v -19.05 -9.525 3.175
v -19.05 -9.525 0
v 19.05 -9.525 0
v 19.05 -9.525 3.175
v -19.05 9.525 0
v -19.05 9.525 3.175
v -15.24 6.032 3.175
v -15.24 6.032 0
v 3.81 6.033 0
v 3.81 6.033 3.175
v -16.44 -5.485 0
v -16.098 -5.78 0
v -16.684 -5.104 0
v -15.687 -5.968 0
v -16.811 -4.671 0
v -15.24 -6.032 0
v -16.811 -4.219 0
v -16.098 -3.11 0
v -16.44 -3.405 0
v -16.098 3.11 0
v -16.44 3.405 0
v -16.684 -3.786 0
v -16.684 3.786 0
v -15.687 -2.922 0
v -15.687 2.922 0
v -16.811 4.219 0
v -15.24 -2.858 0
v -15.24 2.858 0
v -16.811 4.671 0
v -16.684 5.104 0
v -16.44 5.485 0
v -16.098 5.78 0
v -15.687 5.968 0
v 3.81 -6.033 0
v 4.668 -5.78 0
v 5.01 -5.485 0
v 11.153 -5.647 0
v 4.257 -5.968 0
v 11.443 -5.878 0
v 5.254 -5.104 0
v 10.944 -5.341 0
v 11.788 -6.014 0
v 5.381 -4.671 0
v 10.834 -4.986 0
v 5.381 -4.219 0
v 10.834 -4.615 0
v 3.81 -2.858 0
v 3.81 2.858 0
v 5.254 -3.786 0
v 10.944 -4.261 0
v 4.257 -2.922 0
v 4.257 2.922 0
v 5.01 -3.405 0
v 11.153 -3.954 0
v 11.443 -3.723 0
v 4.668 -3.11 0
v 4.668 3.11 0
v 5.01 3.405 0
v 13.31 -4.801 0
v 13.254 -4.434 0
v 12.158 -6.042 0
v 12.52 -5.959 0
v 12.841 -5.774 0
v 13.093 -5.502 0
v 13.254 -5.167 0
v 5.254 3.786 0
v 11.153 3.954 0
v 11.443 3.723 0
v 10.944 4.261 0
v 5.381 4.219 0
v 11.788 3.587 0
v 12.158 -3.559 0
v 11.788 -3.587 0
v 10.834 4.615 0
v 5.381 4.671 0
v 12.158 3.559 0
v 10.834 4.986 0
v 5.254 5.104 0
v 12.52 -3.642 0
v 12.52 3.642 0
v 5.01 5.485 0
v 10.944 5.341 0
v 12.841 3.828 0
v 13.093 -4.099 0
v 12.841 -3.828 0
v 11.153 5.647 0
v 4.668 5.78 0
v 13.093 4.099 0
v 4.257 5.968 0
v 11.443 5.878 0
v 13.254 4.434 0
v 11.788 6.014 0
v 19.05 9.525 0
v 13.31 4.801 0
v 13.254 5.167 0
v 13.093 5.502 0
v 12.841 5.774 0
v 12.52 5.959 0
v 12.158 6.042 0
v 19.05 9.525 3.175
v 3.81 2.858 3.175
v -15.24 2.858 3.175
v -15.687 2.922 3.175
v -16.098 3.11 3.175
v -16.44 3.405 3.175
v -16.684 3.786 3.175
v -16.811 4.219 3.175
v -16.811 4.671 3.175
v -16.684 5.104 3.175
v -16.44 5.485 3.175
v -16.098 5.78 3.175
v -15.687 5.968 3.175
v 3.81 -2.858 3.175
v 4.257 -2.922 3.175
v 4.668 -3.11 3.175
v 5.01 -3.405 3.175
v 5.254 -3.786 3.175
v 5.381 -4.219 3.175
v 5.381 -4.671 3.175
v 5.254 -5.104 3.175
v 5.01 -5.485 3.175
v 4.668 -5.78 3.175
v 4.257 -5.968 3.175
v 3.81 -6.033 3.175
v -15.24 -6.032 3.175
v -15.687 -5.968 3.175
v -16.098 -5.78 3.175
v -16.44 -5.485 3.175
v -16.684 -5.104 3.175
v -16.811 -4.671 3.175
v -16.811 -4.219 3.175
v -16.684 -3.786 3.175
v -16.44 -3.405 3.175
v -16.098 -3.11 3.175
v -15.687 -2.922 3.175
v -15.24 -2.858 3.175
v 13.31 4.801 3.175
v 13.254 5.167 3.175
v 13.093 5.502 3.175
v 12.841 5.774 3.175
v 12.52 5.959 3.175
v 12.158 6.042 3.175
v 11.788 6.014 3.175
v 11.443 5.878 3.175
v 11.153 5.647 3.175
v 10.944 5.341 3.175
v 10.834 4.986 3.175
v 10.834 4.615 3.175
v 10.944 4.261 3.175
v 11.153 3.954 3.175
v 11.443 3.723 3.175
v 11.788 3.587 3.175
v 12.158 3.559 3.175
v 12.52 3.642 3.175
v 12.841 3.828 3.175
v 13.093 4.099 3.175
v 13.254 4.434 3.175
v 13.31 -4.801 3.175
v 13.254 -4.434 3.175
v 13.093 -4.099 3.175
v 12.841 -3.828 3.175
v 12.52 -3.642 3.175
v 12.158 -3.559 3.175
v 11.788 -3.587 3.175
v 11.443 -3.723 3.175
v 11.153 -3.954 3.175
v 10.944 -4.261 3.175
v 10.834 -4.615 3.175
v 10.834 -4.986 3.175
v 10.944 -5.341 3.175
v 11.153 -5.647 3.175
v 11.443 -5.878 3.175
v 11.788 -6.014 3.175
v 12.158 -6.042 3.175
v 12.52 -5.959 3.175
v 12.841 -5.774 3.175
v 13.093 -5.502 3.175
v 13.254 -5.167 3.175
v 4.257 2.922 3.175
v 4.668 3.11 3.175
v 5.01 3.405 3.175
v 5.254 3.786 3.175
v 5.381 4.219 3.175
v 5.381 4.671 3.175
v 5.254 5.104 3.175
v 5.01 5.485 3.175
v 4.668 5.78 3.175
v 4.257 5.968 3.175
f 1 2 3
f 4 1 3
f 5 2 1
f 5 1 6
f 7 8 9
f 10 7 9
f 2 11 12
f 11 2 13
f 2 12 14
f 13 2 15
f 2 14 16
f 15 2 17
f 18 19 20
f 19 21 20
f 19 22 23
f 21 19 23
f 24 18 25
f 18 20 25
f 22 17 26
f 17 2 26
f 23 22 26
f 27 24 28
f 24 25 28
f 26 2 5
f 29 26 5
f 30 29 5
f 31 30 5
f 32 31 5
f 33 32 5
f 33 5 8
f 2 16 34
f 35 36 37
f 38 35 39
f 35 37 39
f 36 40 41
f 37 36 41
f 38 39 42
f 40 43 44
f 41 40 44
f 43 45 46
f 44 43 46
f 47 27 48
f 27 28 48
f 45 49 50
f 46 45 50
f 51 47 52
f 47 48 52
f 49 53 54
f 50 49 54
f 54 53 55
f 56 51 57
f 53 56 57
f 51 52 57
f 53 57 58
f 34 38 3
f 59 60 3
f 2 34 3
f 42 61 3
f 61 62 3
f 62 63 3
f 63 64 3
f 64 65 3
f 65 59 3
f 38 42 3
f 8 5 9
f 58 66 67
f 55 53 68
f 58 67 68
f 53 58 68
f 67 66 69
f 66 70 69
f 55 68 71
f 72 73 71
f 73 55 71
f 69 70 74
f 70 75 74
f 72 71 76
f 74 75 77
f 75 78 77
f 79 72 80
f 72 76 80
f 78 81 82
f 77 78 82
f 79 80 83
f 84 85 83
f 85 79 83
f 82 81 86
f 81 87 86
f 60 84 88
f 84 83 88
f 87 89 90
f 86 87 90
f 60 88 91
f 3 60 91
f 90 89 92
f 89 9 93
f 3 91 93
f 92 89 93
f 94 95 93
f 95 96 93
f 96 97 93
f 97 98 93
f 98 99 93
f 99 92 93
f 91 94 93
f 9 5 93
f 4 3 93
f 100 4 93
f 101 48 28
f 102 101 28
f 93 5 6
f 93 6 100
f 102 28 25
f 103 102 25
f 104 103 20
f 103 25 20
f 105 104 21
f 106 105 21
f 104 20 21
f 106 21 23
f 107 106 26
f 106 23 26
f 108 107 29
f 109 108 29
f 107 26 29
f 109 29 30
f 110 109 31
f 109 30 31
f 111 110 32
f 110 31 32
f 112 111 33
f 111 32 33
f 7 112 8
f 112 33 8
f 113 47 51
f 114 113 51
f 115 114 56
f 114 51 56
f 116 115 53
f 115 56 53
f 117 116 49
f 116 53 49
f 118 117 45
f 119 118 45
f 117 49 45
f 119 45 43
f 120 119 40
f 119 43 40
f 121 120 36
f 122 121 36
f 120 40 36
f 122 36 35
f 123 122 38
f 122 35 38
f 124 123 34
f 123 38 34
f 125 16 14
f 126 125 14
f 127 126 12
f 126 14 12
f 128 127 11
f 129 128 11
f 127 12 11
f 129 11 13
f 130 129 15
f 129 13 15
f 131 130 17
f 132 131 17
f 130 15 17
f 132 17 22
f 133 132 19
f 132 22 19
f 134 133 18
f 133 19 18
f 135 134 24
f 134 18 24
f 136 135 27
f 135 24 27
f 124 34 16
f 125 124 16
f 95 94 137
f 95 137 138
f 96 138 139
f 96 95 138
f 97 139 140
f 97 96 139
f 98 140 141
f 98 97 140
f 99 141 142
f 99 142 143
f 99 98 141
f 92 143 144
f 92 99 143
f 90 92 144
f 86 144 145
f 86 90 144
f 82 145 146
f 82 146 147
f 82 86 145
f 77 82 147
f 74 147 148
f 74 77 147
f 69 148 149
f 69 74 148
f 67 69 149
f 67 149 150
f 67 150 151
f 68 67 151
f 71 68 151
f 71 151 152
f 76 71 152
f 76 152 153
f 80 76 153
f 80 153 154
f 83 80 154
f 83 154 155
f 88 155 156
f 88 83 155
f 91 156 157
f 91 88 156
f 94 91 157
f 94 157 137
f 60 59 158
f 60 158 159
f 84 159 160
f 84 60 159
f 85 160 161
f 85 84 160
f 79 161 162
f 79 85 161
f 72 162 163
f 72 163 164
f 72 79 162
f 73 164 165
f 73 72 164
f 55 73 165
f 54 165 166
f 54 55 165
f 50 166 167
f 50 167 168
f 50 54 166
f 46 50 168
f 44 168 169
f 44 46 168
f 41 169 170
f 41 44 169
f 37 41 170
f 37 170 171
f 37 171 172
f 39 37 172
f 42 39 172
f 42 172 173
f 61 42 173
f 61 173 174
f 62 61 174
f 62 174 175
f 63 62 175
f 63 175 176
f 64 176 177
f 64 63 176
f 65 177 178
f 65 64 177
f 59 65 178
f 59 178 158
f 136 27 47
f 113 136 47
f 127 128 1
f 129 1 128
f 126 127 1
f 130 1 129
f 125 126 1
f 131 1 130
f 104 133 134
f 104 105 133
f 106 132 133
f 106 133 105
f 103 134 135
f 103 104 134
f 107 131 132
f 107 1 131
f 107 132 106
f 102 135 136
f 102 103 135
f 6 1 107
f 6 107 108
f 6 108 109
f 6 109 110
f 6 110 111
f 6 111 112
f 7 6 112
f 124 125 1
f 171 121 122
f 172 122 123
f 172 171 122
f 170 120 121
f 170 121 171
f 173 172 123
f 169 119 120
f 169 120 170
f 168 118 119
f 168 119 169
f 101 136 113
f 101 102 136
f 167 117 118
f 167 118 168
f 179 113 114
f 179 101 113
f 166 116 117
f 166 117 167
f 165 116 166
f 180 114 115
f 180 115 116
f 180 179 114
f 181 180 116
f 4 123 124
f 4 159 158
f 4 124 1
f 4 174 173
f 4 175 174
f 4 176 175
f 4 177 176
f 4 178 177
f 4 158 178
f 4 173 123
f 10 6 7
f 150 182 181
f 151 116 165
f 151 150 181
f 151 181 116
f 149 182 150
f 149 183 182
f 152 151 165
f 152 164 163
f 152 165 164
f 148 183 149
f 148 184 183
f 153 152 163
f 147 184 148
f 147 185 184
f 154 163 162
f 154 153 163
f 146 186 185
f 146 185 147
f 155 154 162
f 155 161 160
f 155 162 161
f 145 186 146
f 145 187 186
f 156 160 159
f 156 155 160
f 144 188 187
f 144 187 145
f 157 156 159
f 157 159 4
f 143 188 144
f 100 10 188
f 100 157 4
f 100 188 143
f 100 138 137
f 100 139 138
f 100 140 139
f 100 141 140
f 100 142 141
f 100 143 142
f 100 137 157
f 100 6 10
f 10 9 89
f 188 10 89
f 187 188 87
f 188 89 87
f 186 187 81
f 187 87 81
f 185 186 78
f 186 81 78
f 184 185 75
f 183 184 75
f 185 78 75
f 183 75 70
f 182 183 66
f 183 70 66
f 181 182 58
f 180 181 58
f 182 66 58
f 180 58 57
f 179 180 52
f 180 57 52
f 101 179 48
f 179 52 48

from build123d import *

# Parameters (mm, degrees)
SKETCH1_W           = 38.1
SKETCH1_H           = 19.05
SKETCH1_R           = 1.2446
BOSS_EXTRUDE1_DEPTH = 3.175


with BuildPart() as part:
    # Sketch1 → Boss-Extrude1 (new body)
    with BuildSketch(Plane.XY):
        Rectangle(SKETCH1_W, SKETCH1_H)
        with BuildLine():
            Line((-15.24, -2.8575), (3.81, -2.8575))
            ThreePointArc((3.81, -2.8575), (5.3975, -4.445), (3.81, -6.0325))
            Line((3.81, -6.0325), (-15.24, -6.0325))
            ThreePointArc((-15.24, -6.0325), (-16.8275, -4.445), (-15.24, -2.8575))
        make_face(mode=Mode.SUBTRACT)
        with Locations((12.065, -4.8006)):
            Circle(SKETCH1_R, mode=Mode.SUBTRACT)
        with Locations((12.065, 4.8006)):
            Circle(SKETCH1_R, mode=Mode.SUBTRACT)
        with BuildLine():
            ThreePointArc((3.81, 6.0325), (5.3975, 4.445), (3.81, 2.8575))
            Line((3.81, 2.8575), (-15.24, 2.8575))
            ThreePointArc((-15.24, 2.8575), (-16.8275, 4.445), (-15.24, 6.0325))
            Line((-15.24, 6.0325), (3.81, 6.0325))
        make_face(mode=Mode.SUBTRACT)
    extrude(amount=BOSS_EXTRUDE1_DEPTH)


solid = part.part
